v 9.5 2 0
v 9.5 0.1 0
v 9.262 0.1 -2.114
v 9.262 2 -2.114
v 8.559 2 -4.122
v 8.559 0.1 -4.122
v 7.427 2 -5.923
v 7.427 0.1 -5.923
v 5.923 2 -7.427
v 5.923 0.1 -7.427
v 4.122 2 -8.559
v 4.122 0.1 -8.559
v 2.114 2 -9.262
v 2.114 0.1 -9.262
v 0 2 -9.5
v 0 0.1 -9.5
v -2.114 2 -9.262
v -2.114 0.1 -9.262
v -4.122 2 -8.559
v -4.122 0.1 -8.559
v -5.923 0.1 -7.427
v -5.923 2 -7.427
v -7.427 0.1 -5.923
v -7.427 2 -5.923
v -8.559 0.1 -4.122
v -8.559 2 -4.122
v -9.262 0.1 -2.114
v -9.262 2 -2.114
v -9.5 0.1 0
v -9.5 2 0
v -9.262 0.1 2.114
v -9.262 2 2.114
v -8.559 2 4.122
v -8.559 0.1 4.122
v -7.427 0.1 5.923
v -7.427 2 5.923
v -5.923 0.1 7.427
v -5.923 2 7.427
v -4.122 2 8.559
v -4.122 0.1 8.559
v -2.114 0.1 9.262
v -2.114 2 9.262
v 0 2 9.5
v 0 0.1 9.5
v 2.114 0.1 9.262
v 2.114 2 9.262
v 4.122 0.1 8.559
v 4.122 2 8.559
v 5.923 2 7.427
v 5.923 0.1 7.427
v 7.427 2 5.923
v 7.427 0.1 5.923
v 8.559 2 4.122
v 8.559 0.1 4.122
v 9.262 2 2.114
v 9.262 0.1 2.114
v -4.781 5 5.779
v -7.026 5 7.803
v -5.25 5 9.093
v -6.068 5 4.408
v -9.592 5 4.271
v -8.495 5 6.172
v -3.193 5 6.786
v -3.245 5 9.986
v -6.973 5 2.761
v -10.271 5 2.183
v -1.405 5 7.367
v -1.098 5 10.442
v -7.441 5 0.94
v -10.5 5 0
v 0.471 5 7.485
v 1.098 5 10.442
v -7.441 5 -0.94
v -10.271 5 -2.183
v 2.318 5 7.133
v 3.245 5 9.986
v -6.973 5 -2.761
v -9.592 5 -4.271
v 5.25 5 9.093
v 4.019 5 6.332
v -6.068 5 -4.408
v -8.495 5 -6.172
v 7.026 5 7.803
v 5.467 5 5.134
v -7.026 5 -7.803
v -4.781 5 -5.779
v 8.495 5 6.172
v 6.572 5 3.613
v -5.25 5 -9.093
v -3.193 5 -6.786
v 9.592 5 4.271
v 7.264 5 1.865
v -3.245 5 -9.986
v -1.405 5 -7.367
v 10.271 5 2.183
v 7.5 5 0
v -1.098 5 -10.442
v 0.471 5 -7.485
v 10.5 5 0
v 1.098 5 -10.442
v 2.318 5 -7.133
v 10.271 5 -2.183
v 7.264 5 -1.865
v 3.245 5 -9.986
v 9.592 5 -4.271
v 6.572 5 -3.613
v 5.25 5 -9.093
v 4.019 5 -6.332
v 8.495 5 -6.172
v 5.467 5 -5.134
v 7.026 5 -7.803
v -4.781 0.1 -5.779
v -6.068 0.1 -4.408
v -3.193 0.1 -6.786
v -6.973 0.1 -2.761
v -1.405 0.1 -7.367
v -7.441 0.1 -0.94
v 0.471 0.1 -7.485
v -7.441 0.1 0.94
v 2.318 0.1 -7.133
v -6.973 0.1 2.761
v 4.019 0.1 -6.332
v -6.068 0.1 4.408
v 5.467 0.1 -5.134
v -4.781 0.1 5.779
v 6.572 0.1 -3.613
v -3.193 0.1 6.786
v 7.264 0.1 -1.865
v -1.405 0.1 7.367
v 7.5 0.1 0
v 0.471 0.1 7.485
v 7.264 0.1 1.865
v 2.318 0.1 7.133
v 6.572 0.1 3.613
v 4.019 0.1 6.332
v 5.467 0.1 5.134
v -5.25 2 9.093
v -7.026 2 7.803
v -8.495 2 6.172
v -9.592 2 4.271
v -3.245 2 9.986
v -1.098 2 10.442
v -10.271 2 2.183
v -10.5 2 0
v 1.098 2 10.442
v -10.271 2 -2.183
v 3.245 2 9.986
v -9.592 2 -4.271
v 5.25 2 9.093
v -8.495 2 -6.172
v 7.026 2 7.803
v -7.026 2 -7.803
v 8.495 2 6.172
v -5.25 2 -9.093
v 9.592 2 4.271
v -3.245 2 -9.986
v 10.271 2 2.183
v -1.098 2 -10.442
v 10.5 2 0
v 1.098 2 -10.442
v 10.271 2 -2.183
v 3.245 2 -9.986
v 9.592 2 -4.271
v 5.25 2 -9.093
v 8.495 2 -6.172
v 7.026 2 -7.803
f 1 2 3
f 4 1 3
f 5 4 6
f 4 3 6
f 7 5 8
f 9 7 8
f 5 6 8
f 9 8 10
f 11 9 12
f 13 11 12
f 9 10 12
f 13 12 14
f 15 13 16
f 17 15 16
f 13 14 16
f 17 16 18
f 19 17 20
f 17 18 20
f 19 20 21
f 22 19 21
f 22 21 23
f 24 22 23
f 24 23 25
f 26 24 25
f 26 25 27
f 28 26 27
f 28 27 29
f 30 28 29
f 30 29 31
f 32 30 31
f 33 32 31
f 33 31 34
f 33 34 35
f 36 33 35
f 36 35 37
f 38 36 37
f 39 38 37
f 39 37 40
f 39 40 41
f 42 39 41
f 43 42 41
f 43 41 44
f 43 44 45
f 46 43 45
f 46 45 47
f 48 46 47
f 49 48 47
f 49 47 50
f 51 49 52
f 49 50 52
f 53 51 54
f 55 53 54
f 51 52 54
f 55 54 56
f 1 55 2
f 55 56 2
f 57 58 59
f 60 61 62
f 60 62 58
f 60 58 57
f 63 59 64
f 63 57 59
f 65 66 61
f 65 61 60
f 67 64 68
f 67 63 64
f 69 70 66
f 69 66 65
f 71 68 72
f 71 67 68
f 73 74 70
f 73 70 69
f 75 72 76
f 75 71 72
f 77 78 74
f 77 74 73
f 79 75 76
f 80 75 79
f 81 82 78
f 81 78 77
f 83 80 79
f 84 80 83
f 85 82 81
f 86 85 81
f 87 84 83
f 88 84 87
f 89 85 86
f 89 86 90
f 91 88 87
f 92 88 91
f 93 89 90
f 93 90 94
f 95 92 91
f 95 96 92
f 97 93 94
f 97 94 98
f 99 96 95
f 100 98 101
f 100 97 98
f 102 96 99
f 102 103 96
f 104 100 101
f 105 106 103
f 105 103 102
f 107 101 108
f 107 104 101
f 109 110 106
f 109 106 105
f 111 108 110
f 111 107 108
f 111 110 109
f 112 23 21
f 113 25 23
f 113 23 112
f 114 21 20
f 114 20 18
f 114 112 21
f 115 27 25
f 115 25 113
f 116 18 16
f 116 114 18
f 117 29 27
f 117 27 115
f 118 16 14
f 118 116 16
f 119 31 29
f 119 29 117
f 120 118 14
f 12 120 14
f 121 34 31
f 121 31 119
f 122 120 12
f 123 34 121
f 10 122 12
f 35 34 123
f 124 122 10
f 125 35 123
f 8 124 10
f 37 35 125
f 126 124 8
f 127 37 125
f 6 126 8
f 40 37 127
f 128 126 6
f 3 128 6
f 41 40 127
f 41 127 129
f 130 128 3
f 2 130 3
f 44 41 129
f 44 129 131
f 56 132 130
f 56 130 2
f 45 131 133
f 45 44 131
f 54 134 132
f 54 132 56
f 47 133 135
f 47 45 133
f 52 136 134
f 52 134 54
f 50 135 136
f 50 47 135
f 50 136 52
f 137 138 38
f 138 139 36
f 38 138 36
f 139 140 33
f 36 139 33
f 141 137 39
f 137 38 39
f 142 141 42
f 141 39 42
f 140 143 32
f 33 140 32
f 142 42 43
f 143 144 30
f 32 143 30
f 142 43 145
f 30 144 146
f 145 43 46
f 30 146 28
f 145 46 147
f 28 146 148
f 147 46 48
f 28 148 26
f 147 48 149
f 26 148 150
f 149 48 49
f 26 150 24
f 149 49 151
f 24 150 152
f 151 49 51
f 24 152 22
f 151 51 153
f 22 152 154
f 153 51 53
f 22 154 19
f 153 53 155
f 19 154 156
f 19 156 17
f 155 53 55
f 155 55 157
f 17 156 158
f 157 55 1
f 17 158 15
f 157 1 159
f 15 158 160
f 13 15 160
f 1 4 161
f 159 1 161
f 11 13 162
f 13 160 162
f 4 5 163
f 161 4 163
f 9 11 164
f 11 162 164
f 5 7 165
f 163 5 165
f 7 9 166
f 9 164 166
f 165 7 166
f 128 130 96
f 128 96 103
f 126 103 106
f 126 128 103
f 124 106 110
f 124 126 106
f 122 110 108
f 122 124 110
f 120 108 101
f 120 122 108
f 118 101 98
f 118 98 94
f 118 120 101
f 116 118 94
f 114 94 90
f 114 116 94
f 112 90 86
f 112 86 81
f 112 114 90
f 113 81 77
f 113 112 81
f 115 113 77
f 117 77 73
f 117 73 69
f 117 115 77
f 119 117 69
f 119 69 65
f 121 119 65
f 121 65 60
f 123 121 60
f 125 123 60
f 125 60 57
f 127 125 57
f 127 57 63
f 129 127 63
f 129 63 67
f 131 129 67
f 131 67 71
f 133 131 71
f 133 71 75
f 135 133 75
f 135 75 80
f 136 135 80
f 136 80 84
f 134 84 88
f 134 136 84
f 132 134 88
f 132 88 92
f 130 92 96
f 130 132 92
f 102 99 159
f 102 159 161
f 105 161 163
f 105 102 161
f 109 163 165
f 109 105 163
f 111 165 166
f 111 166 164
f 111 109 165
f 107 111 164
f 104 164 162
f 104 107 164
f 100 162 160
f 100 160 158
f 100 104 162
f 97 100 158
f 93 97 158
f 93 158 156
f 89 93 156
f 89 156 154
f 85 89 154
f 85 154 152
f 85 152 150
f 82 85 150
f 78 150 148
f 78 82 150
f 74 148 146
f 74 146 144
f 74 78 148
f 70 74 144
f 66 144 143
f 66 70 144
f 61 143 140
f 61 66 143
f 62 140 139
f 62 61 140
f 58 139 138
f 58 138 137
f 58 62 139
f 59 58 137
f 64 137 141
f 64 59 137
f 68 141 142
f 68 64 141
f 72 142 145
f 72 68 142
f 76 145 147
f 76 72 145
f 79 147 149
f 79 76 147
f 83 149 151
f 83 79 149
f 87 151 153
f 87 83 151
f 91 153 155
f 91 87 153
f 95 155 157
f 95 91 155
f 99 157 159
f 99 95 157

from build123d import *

# Parameters (mm, degrees)
SCHIZZO1_R                   = 9.5
SCHIZZO1_R_2                 = 7.5
ESTRUSIONE_ESTRUSIONE1_DEPTH = 5
SCHIZZO2_R                   = 10.5
SCHIZZO2_R_2                 = 9.5
ESTRUSIONE_ESTRUSIONE2_DEPTH = 3
SCHIZZO3_R                   = 9.5
TAGLIO_ESTRUSIONE1_DEPTH     = 0.1


with BuildPart() as part:
    # Schizzo1 → Estrusione-Estrusione1 (new body)
    with BuildSketch(Plane(origin=(0, 0, 0), x_dir=(1, 0, 0), z_dir=(0, 1, 0))):
        Circle(SCHIZZO1_R)
        Circle(SCHIZZO1_R_2, mode=Mode.SUBTRACT)
    extrude(amount=ESTRUSIONE_ESTRUSIONE1_DEPTH)

    # Schizzo2 → Estrusione-Estrusione2 (add)
    with BuildSketch(Plane(origin=(0, 5, 0), x_dir=(1, 0, 0), z_dir=(0, 1, 0))):
        Circle(SCHIZZO2_R)
        Circle(SCHIZZO2_R_2, mode=Mode.SUBTRACT)
    extrude(amount=-ESTRUSIONE_ESTRUSIONE2_DEPTH)

    # Schizzo3 → Taglio-Estrusione1 (cut)
    with BuildSketch(Plane.XZ):
        Circle(SCHIZZO3_R)
    extrude(amount=-TAGLIO_ESTRUSIONE1_DEPTH, mode=Mode.SUBTRACT)


solid = part.part
